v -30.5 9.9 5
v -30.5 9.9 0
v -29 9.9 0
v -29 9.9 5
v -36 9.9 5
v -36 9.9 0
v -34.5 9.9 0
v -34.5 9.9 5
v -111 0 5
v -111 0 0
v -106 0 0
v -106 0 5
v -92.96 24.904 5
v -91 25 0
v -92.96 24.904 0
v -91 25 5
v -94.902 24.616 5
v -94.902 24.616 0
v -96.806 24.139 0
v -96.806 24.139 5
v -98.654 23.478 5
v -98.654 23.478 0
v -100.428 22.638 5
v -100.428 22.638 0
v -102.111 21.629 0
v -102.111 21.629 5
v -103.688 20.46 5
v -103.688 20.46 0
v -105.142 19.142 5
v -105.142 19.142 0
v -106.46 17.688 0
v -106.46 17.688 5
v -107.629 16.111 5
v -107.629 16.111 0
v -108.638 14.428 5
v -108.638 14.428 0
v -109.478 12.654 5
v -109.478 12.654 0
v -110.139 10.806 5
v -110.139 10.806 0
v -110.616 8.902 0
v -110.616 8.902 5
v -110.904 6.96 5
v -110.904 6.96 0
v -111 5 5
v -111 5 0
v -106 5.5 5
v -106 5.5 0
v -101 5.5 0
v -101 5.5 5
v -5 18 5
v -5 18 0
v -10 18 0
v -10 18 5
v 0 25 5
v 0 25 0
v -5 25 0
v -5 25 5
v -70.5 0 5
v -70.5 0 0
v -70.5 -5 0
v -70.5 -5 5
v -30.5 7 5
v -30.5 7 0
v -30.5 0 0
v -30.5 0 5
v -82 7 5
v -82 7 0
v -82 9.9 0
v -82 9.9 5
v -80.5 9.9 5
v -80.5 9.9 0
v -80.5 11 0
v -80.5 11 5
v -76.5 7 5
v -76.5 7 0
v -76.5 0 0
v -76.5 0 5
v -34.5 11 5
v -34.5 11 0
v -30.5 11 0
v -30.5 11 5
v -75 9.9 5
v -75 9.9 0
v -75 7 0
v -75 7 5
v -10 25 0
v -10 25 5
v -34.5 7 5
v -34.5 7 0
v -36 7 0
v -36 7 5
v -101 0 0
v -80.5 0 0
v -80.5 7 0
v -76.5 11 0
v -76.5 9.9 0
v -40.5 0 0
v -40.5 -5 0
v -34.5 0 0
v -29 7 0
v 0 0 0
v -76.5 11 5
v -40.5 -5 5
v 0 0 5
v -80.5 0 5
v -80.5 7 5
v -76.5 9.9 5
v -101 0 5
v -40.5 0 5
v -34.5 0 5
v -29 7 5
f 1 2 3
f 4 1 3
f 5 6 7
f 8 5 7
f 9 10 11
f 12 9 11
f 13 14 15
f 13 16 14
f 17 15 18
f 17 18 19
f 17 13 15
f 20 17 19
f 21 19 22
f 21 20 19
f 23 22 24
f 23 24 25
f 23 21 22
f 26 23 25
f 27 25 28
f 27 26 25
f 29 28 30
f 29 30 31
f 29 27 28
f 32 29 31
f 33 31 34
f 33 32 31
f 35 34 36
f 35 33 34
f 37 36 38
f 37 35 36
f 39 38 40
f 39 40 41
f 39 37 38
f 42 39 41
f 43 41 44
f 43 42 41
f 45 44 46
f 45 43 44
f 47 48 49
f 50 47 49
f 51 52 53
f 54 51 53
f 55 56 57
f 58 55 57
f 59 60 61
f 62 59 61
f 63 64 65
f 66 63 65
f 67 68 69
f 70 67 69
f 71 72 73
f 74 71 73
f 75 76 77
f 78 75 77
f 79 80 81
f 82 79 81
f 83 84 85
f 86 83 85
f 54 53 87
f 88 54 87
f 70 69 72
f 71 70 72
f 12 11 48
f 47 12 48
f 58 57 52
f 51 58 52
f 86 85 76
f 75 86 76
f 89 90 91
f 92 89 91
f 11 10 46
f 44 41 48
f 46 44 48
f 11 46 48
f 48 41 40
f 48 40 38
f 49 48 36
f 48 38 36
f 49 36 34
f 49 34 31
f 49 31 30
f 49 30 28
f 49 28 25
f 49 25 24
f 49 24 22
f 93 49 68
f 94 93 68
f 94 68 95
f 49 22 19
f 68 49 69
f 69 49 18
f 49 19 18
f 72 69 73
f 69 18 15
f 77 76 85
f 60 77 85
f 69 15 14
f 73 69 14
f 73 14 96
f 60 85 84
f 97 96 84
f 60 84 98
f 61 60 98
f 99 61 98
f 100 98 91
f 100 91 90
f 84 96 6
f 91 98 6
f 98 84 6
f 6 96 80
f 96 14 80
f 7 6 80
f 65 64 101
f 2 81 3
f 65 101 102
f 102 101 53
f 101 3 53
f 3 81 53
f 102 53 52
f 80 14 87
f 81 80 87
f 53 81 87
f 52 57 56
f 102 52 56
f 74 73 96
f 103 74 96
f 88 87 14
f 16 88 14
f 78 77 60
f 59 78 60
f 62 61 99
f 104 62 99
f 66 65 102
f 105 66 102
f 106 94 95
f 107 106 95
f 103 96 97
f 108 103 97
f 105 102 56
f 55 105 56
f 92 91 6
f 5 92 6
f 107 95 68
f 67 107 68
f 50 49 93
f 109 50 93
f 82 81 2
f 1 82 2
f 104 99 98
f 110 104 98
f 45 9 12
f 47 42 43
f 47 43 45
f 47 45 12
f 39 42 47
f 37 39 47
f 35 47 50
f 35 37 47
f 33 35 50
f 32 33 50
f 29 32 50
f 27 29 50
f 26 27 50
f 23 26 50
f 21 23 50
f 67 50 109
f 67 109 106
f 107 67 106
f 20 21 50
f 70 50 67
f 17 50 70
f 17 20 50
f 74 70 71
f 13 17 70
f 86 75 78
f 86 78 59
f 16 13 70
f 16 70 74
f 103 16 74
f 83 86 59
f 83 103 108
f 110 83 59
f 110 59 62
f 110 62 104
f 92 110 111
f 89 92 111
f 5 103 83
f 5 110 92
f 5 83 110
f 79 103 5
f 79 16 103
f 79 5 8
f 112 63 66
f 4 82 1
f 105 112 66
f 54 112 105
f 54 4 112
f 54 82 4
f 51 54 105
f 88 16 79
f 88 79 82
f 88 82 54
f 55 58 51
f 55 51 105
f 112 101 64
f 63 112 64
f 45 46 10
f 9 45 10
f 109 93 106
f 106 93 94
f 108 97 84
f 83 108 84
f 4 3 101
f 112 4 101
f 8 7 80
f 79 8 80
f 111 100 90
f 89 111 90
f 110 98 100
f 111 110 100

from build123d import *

# Parameters (mm, degrees)
EXTRUDE_1_DEPTH = 5
FILLET_1_R      = 20


with BuildPart() as part:
    # 草图1 → 凸台-拉伸1 (new body)
    with BuildSketch(Plane.XY):
        Polygon((-101, 0), (-80.5, 0), (-80.5, 7), (-82, 7), (-82, 9.9), (-80.5, 9.9), (-80.5, 11), (-76.5, 11), (-76.5, 9.9), (-75, 9.9), (-75, 7), (-76.5, 7), (-76.5, 0), (-70.5, 0), (-70.5, -5), (-40.5, -5), (-40.5, 0), (-34.5, 0), (-34.5, 7), (-36, 7), (-36, 9.9), (-34.5, 9.9), (-34.5, 11), (-30.5, 11), (-30.5, 9.9), (-29, 9.9), (-29, 7), (-30.5, 7), (-30.5, 0), (0, 0), (0, 25), (-5, 25), (-5, 18), (-10, 18), (-10, 25), (-111, 25), (-111, 0), (-106, 0), (-106, 5.5), (-101, 5.5), align=None)
    extrude(amount=EXTRUDE_1_DEPTH)

    # 圆角1
    fillet_1_edges = [part.edges().sort_by_distance(p)[0] for p in [
        (-111, 25, 2.5),
    ]]
    fillet(fillet_1_edges, radius=FILLET_1_R)


solid = part.part
